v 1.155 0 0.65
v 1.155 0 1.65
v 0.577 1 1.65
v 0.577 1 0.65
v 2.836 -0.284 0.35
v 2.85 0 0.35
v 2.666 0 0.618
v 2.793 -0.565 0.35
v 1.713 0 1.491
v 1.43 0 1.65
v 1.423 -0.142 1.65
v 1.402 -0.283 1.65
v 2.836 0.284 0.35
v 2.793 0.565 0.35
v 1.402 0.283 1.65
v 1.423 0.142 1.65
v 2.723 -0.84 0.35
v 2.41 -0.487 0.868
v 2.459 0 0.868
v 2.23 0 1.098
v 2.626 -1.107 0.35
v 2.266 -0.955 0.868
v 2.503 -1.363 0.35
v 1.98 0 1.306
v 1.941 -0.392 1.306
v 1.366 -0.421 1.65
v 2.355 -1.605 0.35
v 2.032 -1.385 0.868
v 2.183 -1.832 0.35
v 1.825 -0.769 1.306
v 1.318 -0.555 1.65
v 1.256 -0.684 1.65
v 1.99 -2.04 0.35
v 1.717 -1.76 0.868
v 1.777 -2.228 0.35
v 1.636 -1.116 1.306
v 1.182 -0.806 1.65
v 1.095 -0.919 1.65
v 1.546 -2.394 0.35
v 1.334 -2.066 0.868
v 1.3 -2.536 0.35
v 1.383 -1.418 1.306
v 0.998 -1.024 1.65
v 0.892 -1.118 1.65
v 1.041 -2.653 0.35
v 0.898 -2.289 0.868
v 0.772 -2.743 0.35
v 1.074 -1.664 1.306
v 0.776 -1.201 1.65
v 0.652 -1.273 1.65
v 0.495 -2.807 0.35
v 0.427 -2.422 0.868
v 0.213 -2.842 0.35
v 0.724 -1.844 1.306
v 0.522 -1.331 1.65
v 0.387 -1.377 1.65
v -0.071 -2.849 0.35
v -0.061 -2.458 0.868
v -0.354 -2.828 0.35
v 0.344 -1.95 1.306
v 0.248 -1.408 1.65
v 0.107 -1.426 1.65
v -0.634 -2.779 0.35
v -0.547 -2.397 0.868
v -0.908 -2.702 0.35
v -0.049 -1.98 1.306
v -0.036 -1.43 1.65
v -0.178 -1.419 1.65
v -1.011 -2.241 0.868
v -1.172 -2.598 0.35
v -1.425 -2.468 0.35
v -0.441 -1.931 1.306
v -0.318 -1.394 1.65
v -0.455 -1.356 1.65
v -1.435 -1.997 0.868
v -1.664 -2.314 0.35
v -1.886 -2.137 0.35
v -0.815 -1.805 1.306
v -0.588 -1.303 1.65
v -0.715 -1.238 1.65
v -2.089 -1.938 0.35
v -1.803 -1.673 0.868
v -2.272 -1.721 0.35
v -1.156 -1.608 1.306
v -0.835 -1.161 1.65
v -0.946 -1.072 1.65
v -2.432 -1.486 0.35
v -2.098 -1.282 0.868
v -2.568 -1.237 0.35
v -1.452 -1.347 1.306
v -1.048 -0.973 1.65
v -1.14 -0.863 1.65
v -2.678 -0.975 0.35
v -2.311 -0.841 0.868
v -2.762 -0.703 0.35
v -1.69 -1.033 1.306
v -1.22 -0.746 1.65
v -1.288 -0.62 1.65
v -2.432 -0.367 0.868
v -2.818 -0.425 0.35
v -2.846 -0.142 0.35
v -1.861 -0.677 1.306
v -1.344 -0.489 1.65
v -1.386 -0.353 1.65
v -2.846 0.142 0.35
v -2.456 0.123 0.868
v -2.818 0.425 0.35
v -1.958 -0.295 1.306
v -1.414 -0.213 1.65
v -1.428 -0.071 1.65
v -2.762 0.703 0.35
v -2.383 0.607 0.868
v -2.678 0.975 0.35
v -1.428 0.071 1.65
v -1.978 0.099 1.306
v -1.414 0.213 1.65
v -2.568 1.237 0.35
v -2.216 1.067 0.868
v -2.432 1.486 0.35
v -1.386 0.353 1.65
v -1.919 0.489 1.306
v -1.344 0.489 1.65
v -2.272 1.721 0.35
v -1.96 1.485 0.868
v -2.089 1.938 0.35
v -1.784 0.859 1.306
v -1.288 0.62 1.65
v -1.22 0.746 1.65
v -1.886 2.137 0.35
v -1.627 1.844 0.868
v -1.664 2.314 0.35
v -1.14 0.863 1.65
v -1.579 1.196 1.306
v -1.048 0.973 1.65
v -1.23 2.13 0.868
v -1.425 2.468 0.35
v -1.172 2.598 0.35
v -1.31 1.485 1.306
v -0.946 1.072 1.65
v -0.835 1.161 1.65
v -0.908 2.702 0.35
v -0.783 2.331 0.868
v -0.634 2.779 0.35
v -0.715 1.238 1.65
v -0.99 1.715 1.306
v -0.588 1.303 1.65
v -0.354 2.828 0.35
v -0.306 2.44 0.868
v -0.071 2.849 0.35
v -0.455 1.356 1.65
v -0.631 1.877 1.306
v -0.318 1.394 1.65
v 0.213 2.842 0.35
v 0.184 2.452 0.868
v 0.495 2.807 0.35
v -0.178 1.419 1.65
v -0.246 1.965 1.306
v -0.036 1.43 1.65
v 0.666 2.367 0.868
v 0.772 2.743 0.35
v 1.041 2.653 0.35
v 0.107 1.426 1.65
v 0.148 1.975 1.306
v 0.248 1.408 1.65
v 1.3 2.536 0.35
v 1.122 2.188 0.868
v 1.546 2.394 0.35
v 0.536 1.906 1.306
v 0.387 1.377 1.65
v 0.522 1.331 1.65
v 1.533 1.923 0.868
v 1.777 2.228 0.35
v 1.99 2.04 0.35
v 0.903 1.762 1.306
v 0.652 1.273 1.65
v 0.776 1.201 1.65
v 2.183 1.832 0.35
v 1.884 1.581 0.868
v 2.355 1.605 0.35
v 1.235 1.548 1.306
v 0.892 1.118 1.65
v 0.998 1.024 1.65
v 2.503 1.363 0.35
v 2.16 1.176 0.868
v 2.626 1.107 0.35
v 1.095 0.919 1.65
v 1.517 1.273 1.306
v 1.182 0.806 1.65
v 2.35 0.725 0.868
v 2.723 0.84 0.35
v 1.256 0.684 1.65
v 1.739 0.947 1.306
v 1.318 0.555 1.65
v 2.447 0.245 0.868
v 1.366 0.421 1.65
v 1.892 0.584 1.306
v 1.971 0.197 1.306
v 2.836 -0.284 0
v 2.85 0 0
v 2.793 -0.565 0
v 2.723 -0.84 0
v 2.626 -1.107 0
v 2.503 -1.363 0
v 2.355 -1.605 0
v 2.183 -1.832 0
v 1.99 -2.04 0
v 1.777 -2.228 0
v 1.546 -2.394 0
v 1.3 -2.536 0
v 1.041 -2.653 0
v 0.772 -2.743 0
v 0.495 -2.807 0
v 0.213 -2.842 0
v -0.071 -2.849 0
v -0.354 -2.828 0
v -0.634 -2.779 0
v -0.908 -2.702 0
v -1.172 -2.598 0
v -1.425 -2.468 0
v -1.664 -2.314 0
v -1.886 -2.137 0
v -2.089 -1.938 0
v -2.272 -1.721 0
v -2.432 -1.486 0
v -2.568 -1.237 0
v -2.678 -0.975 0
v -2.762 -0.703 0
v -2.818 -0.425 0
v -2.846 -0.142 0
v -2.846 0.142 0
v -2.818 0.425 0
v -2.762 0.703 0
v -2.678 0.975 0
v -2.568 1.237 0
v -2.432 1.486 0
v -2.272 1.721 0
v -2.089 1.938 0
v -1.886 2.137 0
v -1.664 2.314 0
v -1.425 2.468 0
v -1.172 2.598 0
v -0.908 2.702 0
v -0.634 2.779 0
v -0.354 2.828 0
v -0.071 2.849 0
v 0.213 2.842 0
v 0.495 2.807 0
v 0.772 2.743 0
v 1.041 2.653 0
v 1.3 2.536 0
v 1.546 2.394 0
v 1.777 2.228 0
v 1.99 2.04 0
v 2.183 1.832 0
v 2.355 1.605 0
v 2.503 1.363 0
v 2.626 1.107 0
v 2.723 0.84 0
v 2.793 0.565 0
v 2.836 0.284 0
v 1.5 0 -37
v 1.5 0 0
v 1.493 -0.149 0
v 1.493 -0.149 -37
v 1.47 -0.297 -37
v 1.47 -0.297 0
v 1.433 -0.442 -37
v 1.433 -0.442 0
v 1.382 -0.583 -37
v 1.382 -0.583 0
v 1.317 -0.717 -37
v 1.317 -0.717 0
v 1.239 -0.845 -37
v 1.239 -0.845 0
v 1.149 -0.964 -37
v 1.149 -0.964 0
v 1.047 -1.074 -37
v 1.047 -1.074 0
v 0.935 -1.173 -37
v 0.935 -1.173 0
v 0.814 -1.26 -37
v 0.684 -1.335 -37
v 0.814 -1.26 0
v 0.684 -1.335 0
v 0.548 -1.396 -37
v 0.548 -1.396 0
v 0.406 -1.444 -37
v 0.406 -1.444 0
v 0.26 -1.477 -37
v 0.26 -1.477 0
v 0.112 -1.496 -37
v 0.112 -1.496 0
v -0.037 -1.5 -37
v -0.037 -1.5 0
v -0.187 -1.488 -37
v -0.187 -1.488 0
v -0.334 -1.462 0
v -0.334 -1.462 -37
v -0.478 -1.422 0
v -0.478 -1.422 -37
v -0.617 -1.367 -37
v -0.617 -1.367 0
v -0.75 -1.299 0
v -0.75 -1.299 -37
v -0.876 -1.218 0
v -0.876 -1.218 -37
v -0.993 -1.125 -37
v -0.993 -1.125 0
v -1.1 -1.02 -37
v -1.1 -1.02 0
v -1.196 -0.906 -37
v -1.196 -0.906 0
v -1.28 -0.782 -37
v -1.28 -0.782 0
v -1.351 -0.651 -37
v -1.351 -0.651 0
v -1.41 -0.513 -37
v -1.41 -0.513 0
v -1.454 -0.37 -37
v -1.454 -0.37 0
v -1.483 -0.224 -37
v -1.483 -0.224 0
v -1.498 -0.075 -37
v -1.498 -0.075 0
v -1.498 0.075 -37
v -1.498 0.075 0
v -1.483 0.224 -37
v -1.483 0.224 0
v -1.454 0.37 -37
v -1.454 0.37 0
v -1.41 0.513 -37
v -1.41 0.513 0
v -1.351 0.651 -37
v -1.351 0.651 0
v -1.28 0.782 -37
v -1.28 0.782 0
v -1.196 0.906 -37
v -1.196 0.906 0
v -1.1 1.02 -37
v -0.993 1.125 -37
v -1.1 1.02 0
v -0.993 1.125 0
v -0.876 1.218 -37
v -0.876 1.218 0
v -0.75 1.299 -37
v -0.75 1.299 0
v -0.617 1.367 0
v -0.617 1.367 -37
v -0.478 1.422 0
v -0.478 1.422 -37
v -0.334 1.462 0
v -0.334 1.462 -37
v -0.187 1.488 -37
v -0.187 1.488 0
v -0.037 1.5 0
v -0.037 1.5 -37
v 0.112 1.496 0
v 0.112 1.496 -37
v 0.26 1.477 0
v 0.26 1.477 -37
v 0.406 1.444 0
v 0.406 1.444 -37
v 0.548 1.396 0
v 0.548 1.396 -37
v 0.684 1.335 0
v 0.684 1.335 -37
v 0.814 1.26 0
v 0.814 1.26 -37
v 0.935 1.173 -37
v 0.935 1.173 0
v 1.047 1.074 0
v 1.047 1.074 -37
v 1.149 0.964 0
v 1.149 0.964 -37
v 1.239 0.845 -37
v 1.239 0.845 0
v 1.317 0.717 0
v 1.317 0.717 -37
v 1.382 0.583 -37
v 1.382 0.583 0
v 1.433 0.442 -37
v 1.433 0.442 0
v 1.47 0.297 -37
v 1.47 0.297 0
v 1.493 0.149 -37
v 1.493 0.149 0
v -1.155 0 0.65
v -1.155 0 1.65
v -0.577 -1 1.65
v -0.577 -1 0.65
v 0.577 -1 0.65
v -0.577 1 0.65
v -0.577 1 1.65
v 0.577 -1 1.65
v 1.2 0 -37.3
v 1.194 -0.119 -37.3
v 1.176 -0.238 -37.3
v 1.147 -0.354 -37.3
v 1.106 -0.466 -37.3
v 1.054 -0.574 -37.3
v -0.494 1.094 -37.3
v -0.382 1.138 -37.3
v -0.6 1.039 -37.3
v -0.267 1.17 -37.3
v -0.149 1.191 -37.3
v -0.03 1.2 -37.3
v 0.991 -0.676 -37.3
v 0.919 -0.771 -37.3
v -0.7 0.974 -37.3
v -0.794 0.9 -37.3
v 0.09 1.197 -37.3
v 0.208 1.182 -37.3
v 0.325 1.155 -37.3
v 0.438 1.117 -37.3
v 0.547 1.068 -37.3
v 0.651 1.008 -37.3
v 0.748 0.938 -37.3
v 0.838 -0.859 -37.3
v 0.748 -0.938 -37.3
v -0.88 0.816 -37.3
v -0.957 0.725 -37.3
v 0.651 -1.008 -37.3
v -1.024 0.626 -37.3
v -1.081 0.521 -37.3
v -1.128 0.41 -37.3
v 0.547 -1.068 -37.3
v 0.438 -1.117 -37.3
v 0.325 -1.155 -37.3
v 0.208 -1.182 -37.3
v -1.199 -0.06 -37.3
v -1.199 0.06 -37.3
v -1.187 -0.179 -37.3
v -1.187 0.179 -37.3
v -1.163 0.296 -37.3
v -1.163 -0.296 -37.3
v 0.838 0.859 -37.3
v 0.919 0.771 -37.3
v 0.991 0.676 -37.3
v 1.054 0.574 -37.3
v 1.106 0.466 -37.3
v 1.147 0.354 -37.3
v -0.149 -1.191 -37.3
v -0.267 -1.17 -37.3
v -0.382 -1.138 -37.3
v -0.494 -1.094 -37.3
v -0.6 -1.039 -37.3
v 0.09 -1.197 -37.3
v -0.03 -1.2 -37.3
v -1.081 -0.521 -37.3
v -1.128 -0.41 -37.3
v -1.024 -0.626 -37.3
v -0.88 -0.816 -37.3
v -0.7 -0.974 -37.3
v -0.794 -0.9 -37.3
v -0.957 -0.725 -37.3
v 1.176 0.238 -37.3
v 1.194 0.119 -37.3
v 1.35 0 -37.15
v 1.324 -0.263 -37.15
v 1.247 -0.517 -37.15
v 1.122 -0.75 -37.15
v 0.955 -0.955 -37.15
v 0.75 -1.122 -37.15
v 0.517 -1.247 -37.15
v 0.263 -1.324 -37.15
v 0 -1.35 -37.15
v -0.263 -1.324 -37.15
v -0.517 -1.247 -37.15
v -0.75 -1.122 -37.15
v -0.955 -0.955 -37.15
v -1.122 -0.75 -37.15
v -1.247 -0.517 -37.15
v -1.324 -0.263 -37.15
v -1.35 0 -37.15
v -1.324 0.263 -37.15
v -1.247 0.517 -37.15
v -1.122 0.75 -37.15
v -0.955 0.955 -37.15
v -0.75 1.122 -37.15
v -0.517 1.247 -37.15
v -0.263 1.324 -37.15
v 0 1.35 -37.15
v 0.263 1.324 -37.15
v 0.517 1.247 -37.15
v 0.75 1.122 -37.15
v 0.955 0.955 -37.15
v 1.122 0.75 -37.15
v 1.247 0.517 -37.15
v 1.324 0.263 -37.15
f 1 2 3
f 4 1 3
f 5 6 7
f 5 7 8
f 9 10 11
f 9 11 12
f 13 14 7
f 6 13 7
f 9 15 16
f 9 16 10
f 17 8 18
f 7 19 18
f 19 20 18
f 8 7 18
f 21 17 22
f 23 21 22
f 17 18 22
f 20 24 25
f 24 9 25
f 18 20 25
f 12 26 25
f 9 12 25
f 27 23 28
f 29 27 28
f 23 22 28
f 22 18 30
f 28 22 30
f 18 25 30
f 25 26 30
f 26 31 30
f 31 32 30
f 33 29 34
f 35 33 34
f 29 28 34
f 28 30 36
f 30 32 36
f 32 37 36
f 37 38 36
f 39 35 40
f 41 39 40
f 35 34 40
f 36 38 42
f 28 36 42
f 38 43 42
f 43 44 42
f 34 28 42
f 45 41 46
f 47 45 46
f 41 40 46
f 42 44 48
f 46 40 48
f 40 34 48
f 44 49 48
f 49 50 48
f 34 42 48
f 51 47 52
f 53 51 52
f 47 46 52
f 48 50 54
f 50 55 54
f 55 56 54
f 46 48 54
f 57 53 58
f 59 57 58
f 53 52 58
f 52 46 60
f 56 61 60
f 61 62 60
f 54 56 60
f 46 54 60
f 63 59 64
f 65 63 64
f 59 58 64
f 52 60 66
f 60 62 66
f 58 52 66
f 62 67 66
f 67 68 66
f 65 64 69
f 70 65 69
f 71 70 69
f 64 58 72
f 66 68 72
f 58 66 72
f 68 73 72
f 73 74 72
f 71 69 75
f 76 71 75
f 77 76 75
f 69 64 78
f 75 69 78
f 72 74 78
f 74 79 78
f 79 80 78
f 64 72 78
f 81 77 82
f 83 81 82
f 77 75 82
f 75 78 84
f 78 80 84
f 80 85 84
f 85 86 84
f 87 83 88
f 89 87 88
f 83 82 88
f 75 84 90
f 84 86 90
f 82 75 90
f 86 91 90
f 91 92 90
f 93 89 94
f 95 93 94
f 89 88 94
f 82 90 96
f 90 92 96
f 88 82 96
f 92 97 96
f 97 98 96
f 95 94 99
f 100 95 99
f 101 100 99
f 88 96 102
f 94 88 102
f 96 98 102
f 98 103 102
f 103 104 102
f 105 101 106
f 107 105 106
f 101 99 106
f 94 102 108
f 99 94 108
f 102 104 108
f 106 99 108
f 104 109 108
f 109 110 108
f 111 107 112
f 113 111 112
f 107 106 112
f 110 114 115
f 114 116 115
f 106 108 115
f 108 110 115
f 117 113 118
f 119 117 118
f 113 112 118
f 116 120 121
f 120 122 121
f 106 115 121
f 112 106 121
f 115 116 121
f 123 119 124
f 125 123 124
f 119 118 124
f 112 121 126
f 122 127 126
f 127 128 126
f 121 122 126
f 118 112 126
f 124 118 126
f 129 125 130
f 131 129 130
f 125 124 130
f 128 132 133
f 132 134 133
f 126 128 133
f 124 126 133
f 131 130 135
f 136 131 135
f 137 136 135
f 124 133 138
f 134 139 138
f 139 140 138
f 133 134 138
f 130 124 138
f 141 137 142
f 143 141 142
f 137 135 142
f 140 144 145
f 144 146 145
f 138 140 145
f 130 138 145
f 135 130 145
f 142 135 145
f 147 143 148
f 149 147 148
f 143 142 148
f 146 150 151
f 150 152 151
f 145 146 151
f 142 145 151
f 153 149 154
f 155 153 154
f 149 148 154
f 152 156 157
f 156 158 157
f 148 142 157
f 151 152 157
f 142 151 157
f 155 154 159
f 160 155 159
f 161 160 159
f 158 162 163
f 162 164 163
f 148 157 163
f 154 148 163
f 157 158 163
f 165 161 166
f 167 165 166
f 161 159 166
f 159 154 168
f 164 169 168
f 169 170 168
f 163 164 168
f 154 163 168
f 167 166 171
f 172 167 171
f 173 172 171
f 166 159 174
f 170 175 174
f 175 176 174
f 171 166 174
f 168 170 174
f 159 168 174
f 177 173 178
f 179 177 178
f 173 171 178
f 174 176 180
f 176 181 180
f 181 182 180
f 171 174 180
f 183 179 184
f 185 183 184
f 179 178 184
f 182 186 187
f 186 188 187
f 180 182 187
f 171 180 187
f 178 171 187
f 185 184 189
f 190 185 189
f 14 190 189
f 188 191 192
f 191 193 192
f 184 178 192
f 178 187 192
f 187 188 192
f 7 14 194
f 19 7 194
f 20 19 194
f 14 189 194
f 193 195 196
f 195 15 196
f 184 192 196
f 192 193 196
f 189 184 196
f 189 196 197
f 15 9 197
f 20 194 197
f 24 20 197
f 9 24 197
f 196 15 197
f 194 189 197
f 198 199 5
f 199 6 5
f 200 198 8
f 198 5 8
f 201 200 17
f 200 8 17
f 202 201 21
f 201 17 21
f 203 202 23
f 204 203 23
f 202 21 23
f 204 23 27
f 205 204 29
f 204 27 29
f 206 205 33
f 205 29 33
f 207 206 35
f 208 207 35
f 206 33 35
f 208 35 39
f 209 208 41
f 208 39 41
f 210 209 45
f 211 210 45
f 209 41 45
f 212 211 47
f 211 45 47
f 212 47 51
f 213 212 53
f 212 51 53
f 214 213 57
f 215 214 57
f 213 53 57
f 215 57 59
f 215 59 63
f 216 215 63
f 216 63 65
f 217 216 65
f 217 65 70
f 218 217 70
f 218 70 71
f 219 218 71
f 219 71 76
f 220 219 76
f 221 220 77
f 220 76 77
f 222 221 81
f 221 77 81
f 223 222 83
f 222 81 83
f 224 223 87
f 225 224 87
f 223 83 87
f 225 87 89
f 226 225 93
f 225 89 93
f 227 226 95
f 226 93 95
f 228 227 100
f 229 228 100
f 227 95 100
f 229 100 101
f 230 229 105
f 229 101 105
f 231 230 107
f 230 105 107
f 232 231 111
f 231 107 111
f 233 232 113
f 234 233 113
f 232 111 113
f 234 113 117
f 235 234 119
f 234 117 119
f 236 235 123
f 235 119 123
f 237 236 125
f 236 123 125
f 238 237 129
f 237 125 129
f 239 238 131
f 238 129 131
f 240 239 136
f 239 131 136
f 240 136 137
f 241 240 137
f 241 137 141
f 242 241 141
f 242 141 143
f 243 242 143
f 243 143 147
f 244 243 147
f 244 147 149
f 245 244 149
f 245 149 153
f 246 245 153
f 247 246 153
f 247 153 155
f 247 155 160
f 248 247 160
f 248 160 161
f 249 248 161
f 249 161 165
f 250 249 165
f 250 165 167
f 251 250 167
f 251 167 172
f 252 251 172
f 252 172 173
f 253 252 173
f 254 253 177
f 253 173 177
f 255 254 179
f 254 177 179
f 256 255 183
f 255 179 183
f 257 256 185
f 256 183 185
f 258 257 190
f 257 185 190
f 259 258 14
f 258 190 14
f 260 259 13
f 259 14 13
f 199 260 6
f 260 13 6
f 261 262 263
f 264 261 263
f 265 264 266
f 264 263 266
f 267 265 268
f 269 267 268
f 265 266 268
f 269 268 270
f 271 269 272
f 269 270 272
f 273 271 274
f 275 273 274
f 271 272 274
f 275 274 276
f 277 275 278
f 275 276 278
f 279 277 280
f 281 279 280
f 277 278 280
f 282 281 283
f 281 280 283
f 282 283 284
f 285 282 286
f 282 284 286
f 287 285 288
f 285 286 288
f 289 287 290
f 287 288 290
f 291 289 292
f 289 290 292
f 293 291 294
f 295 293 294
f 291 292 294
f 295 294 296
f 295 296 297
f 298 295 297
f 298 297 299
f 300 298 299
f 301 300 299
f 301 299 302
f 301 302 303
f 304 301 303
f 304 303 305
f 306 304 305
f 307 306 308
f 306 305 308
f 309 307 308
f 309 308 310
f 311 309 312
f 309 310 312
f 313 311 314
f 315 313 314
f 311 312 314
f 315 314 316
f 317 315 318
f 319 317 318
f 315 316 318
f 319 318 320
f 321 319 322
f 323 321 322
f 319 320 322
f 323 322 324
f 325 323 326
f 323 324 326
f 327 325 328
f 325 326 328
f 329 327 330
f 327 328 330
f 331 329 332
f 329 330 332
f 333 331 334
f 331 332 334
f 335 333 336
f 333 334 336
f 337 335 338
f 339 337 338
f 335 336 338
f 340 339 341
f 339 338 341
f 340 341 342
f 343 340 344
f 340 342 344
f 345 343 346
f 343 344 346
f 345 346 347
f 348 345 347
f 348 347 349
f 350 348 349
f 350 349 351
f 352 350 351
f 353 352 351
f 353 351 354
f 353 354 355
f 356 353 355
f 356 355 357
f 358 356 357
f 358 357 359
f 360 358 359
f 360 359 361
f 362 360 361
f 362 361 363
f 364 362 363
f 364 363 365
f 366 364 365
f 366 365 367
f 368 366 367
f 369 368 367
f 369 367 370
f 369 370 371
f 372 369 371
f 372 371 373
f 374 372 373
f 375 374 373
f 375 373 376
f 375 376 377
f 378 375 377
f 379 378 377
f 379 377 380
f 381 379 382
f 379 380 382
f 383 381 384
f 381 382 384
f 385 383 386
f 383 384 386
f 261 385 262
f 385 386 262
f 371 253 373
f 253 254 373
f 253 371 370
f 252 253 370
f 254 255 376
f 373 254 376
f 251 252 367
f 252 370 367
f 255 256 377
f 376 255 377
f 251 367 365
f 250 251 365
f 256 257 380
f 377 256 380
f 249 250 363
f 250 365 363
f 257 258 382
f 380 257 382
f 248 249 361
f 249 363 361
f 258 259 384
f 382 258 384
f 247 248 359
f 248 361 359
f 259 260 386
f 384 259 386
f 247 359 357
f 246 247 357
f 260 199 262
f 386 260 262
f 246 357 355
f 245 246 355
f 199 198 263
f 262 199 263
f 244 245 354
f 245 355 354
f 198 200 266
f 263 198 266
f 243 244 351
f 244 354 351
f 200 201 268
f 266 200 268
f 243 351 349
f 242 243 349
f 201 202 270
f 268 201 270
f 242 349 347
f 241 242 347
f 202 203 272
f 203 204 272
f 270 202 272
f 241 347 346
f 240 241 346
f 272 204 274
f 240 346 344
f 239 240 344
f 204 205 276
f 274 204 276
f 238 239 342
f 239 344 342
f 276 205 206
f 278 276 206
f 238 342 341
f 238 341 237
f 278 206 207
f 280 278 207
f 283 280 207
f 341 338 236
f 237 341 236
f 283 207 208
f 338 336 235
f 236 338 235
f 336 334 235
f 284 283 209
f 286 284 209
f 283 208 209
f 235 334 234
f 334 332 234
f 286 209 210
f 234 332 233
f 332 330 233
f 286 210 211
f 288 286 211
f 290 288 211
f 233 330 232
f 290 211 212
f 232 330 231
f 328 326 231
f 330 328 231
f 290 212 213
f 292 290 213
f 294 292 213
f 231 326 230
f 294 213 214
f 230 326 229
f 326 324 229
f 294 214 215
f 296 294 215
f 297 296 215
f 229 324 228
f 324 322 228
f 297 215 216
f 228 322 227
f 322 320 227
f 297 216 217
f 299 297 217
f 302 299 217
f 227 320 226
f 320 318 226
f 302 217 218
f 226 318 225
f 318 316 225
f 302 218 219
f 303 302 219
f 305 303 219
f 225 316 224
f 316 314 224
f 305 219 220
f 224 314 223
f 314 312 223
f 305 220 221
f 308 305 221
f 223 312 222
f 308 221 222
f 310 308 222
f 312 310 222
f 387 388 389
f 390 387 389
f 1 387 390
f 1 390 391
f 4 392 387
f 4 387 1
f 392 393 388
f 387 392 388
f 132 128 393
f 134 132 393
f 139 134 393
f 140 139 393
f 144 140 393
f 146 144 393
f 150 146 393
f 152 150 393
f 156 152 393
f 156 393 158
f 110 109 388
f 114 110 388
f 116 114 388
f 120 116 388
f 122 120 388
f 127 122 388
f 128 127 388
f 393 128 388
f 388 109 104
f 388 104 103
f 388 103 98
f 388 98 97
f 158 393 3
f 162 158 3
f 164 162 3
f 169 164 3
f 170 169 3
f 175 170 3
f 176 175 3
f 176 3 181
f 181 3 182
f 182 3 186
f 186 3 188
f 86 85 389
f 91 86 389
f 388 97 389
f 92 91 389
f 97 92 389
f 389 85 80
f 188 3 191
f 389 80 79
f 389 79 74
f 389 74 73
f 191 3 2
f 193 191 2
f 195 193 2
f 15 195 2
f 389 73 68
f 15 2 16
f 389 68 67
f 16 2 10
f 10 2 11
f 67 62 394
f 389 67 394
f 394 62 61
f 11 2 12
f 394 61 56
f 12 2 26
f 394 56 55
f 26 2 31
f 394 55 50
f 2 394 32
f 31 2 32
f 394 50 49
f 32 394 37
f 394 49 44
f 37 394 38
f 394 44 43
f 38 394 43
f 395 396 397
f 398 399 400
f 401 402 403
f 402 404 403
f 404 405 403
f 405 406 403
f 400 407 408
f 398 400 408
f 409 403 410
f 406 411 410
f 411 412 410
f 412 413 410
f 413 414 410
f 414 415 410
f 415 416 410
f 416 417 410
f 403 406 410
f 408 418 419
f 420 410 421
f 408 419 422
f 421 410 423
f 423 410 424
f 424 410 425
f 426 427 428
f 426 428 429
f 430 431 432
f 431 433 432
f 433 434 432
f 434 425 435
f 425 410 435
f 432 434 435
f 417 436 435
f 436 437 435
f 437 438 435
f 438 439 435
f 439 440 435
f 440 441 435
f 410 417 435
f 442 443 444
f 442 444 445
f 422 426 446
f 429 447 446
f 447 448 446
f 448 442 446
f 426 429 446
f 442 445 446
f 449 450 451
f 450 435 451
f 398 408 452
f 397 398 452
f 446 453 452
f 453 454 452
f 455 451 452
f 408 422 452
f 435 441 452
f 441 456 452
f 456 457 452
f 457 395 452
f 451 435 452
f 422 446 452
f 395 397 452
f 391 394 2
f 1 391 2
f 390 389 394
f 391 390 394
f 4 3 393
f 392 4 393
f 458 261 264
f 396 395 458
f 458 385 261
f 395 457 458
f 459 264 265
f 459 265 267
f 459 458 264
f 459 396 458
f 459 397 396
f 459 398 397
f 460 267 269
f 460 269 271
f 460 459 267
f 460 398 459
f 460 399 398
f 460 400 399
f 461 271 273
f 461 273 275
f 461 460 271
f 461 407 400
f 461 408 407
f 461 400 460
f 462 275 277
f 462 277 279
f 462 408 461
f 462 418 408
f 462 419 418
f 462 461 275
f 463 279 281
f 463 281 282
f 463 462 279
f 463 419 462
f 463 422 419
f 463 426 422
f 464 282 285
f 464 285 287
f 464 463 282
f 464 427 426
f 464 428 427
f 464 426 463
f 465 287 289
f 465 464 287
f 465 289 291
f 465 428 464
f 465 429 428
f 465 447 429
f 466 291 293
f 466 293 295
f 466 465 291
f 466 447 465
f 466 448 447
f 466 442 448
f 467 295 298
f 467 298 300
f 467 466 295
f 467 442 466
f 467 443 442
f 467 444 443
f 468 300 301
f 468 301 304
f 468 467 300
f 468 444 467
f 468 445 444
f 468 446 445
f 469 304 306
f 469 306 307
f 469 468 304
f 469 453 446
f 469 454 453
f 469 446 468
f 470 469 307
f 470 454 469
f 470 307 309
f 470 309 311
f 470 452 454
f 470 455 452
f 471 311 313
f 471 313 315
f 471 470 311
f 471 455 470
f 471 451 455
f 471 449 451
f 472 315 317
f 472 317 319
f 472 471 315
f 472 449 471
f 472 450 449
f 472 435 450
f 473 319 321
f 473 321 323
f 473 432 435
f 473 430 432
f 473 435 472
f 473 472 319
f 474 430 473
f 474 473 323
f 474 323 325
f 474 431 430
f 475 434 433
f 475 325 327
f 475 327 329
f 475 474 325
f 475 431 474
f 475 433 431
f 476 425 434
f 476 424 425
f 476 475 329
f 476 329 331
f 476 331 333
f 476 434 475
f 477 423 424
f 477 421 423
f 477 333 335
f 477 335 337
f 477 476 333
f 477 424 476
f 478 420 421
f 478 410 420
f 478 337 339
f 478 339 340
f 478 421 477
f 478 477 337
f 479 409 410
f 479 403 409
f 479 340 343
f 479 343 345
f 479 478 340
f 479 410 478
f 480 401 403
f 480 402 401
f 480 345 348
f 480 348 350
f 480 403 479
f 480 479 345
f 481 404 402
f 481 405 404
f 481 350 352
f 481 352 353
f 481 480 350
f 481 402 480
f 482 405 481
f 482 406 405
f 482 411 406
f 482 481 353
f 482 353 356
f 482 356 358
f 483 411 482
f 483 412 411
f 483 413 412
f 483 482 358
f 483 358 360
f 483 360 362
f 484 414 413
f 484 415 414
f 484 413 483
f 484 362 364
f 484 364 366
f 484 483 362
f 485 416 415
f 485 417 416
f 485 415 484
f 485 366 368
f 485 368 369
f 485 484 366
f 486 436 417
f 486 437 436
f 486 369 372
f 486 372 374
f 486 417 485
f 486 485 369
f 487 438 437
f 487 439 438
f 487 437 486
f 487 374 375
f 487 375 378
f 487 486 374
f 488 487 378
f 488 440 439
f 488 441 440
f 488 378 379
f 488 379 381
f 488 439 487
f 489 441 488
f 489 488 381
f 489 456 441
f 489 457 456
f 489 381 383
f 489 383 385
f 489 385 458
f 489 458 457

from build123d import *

# Parameters (mm, degrees)
CUT_EXTRUDE_1_DEPTH = 1
CHAMFER_2_SIZE      = 0.3


with BuildPart() as part:
    # 草图1 → 旋转1 (revolve)
    with BuildSketch(Plane(origin=(0, 0, 0), x_dir=(0, 0, -1), z_dir=(1, 0, 0)), mode=Mode.PRIVATE) as revolve_1_sk:
        with BuildLine():
            Line((0, 1.5), (0, 2.85))
            Line((0, 2.85), (-0.35, 2.85))
            ThreePointArc((-0.35, 2.85), (-1.098097646, 2.229807704), (-1.65, 1.43))
            Line((-1.65, 1.43), (-1.65, 0))
            Line((-1.65, 0), (0, 0))
            Line((0, 0), (37.3, 0))
            Line((37.3, 0), (37.3, 1.5))
            Line((37.3, 1.5), (0, 1.5))
        make_face()
    revolve(revolve_1_sk.sketch.rotate(Axis((0, 0, 0), (0, 0, -1)), 90), axis=Axis((0, 0, 0), (0, 0, -1)))

    # 草图2 → 切除-拉伸1 (cut)
    with BuildSketch(Plane.XY.offset(1.65)):
        Polygon((-0.577350269, 1), (-1.154700538, 0), (-0.577350269, -1), (0.577350269, -1), (1.154700538, 0), (0.577350269, 1), align=None)
    extrude(amount=-CUT_EXTRUDE_1_DEPTH, mode=Mode.SUBTRACT)

    # 倒角2
    chamfer_2_edges = [part.edges().sort_by_distance(p)[0] for p in [
        (-1.5, 0, -37.3),
    ]]
    chamfer(chamfer_2_edges, length=CHAMFER_2_SIZE)


solid = part.part
